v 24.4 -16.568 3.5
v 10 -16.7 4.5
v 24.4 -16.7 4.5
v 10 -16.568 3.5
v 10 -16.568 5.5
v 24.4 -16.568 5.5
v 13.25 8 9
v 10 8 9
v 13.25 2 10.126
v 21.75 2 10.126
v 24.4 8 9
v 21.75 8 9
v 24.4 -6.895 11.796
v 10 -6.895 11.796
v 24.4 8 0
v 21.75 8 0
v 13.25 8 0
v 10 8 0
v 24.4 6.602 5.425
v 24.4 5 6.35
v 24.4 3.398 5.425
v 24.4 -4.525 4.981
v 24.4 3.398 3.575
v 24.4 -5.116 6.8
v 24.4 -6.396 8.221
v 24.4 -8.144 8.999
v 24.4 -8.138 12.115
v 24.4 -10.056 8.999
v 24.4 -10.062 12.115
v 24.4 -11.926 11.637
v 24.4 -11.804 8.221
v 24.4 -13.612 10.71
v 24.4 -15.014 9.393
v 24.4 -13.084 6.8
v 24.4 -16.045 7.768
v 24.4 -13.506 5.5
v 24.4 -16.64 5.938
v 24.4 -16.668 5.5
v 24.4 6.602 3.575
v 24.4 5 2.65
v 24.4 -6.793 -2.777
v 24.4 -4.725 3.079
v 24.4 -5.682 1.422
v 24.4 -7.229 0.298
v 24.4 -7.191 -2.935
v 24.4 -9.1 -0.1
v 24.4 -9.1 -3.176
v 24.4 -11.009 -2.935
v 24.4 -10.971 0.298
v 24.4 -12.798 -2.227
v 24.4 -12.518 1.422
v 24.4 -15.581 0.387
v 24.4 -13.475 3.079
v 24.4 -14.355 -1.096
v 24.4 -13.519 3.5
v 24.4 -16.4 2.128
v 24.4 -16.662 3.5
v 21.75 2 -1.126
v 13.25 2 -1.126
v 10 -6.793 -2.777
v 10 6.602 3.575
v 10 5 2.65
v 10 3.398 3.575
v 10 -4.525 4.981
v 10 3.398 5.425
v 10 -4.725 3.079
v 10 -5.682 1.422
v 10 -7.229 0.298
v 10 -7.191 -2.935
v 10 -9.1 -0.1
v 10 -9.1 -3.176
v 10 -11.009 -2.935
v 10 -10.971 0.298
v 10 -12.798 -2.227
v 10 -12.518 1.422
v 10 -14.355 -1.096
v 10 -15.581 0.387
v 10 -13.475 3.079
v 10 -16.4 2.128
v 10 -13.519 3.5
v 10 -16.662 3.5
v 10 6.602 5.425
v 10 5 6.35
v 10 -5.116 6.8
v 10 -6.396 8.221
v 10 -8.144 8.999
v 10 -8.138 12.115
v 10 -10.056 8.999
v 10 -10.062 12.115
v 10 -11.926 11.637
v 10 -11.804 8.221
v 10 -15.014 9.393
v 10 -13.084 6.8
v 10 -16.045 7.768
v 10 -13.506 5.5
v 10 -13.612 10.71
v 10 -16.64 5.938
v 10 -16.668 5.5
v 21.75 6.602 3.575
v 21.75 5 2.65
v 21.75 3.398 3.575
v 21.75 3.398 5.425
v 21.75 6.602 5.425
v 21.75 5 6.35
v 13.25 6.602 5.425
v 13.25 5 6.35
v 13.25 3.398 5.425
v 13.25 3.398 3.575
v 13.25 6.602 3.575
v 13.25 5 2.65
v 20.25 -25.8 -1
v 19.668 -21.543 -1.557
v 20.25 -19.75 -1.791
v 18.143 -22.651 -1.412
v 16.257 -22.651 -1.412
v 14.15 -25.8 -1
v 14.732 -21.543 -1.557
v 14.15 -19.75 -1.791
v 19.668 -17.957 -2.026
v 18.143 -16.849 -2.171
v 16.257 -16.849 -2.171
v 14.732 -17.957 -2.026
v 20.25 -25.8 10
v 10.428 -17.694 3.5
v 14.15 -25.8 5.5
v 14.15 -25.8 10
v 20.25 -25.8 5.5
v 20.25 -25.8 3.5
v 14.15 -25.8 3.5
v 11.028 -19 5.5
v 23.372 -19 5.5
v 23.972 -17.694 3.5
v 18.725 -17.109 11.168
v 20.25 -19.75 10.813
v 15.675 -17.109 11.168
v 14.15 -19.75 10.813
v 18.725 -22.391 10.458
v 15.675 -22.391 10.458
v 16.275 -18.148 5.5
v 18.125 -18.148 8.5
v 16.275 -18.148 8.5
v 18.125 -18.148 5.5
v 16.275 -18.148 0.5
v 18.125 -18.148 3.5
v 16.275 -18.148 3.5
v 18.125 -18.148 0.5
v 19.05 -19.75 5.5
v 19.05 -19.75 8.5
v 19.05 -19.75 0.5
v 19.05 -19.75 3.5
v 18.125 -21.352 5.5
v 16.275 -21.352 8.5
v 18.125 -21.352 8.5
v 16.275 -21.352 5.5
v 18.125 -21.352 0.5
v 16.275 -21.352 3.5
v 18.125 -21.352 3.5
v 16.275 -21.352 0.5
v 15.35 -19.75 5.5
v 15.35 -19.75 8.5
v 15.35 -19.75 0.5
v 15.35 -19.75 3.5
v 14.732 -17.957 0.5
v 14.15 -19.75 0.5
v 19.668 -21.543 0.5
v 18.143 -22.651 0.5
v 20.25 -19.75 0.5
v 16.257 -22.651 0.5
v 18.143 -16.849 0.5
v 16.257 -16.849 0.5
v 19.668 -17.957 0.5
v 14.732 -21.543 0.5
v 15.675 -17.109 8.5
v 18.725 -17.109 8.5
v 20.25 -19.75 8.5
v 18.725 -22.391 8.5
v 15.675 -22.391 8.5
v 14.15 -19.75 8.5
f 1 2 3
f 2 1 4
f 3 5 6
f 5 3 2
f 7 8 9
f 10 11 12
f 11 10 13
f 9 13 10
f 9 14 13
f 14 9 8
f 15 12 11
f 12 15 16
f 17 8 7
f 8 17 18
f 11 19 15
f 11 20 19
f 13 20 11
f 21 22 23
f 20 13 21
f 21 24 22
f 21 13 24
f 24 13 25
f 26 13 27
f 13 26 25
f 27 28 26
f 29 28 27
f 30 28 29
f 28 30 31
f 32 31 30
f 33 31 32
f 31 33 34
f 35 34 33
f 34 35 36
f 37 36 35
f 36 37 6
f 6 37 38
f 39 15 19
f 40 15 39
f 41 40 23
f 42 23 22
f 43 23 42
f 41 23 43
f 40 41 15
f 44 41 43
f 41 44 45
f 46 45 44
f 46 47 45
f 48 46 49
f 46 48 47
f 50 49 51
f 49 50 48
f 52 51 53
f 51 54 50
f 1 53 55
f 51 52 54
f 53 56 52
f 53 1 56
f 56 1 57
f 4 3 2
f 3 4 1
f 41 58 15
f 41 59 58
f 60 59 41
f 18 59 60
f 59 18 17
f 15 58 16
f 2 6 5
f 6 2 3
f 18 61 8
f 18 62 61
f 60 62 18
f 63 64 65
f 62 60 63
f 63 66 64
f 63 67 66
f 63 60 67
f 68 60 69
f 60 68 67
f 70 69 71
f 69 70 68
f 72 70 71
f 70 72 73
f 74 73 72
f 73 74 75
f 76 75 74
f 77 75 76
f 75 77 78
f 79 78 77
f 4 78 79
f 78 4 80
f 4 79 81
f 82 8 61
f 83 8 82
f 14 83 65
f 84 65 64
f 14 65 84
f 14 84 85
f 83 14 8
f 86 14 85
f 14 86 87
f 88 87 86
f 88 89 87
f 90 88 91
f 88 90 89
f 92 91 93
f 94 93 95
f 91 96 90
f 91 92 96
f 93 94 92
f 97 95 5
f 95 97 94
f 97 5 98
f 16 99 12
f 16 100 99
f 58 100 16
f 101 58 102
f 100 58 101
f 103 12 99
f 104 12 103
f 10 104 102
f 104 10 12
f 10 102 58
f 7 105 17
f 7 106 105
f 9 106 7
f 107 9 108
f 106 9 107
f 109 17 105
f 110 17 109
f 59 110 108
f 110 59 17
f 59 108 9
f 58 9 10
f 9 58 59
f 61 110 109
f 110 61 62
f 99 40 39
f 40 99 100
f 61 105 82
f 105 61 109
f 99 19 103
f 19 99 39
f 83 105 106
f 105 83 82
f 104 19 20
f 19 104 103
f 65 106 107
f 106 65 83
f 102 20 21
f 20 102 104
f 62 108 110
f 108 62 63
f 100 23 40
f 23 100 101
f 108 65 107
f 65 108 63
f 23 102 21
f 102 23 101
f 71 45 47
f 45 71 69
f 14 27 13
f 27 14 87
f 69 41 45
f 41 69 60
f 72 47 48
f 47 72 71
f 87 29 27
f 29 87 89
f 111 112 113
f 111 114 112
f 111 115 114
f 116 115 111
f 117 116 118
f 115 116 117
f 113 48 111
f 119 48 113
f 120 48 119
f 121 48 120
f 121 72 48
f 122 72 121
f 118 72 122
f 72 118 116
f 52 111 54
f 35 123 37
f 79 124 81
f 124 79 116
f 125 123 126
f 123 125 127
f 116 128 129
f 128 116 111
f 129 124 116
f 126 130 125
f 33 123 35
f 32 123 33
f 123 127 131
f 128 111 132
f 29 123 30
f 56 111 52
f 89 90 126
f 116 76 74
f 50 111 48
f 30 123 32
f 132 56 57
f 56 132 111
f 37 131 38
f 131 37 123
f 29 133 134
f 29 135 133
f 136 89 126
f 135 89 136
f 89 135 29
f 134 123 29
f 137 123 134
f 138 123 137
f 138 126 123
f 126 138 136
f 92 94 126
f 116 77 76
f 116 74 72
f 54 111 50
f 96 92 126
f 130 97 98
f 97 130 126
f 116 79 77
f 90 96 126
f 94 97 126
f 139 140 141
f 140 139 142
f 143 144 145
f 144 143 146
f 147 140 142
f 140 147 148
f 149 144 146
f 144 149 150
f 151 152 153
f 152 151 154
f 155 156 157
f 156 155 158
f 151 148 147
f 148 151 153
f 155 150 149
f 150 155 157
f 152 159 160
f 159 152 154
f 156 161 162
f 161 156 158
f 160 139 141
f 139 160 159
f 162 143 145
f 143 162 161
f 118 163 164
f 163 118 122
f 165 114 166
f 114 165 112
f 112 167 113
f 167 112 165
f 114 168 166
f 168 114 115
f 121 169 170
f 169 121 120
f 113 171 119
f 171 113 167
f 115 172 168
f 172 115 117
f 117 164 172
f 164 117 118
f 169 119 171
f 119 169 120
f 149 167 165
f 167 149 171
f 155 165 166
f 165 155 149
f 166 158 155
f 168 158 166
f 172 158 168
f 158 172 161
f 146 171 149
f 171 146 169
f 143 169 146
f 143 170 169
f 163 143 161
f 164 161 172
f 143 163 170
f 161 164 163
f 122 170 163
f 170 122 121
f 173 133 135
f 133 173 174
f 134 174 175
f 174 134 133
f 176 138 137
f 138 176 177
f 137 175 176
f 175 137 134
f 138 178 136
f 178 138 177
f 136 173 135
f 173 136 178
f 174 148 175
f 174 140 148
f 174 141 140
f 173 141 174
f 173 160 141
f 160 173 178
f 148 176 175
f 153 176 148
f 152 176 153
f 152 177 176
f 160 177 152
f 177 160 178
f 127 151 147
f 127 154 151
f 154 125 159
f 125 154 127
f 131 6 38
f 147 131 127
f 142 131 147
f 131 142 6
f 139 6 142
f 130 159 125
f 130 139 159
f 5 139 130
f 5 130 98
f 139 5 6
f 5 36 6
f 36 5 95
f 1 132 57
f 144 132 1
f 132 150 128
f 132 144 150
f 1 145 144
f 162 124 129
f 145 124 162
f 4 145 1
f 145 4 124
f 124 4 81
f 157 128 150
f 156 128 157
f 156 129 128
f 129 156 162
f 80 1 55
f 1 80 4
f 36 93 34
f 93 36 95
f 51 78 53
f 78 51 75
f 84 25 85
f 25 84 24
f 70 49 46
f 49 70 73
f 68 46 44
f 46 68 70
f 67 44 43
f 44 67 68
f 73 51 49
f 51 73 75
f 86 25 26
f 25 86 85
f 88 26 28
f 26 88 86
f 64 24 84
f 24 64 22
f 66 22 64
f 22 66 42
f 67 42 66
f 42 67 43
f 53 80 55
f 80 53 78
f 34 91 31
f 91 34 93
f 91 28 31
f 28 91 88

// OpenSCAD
$fn = 0;

enable_angledtabs = 1;  // [0,1]
enable_ledge = 1;  // [0,1]
clamp_height = 9;  // [0:200]
clamp_length = 8; // [0:200]
clamp_width = 15; // [0:200]
//clamp_depth = 10;  // how deep into the part the gap proceeds
clamp_gap_depth = 7;  // [2:190]
slot_gap = 2;  // [2:190]
plate_thickness = 8.5; // [2:190]
screw_hole_diam = 3.7;  // [1:20]
screw_hole_depth = 4;  // [0:20]
screw_recess_diam = 6.1; // [0:20]
wiretab_angle = 90;  // [-270:270]
nut_type = 6; // [4:6]
wire_diam = 9.2; // [1:40]

hinged_pole_clamp(
clamp_width=clamp_width,
  depth = 10,
  length = clamp_length + 1,
  gap=clamp_gap_depth,
  height=clamp_height,
  hole_diam=screw_hole_diam,
  hole_recess_diam=screw_recess_diam,
  wirediam=wire_diam,
  nut_type=nut_type
  );


module hinged_pole_clamp(
    depth,
    length,
    gap,
    height,
    hole_diam,
    clamp_width,
    hole_recess_diam,
    wirediam,
    horiz_tab_angle=40,
    horiz_thick=3,
    nut_type=6
){
  hinge_fill_x = depth; //hardcoded to fit the hinge footprint
  hinge_fill_y = length;
  hinge_fill_z = height;
  hole_gap = gap;
  hole_r = hole_diam/2;
  pole_r = clamp_width/2;
  hole_recess_r = hole_recess_diam/2;
    

  wire_r = wirediam/2;

  half_space = 0; // gap between the two halfs
  half_width = clamp_width * 1.2;
  half_depth = clamp_width * 0.6;
    union(){
      difference(){
          
          //back portion
        hull(){
           

//square portion
          translate([hinge_fill_x,-1 ,0])
              cube(size=[half_width*0.8, length, hinge_fill_z]);

//ledge
            if (enable_ledge == 1)
            {
          translate([hinge_fill_x,0-(clamp_width/2)+(horiz_thick)-(wire_r),height/2])
            pole_with_tabs_neg(
              width=half_width*0.8,
              pole_r=wire_r,
              pole_thick=horiz_thick,
              hole_diam=screw_hole_diam,
              tab=false,
              tab_angle=horiz_tab_angle);
            }
        }


        // wire hole
        translate([
            hinge_fill_x-(clamp_width*0.1),
            0-(clamp_width/2)+(horiz_thick)-(wire_r),
            height/2])
          pole_with_tabs_neg(
            width=half_width*0.9,
            pole_r=wire_r,
            pole_thick=horiz_thick,
            hole_diam=screw_hole_diam,
            tab=true,
            tab_angle=horiz_tab_angle);
        echo(( depth + (clamp_width / 2 ) - (plate_thickness /2) ));
        // plate slot
        //translate([ ((hinge_fill_x * 2)), length / 2 - clamp_gap +.25 ,hinge_fill_x + 1]) 
        //translate([ (clamp_width / 2 + (plate_thickness * 2)) + 2, length / 2 - clamp_gap_depth +.25 ,height  + 10  ]) 
            translate([ ( depth + (clamp_width / 2 ) - (plate_thickness /2)), (length - clamp_gap_depth),height  + 10  ]) 
            rotate(a=90, v=[0,1,0]) 
            cube(size=[height + 20, hole_gap, plate_thickness]);
            
        //screw hole
            translate([0, length - screw_hole_depth,height/2])
            rotate(a=90, v=[0,1,0])
            cylinder(h=hinge_fill_x * 4, r=hole_diam/2);

      }


        // the hole and fin
      translate([
          hinge_fill_x,
          0-(clamp_width/2)+(horiz_thick)-(wire_r),
          height/2])
        pole_with_tabs(
          width=half_width*0.8,
          pole_r=wire_r,
          pole_thick=horiz_thick,
          hole_diam=screw_hole_diam,
          hole_recess_diam=screw_recess_diam,
          nut_type=nut_type,
          tab_angle=horiz_tab_angle);

    }
}



//*********************************************************

module pole_with_tabs_neg(width, pole_r, pole_thick, hole_diam, tab=false, tab_angle=0, gap=1){
  rotate(a=90, v=[0,1,0]){
    cylinder(h=width, r=pole_r+pole_thick);
  }

  if(tab==true){
    // screw hole in tab
    rotate(a=tab_angle, v=[1,0,0])
      translate([width/2,
                 0,
                 pole_r+(pole_thick)+hole_diam ]) {
        // tab gap
        cube([width*1.1, gap, (hole_diam*2)+(pole_thick*3)], center=true);
      }
  }
}


module pole_with_tabs(width, pole_r, pole_thick, hole_diam, hole_recess_diam, nut_type=6, tab_angle=0, gap=1){
  hole_r = hole_diam/2;
  difference(){
    union(){
      rotate(a=90, v=[0,1,0]){
        cylinder(h=width, r=(pole_r+pole_thick)*1.01);
      }

      // tab block
      hull(){
          
          //angled tab sides
          if (enable_angledtabs == 1){
            rotate(a=90, v=[0,1,0]){
              cylinder(h=width, r=(pole_r+pole_thick)*1.01);
            }
          }
        
        //tab
        rotate(a=wiretab_angle, v=[1,0,0])
          translate([width/2, 0, ((hole_recess_diam)+(pole_thick*2)+pole_r)/2]){
            cube([
              hole_recess_diam,
              (pole_thick*2)+5,
              (hole_recess_diam)+(pole_thick*2)+pole_r],
              center=true);
          }
        }
    }

    // pole hole
    translate([0-(width*0.5), 0, 0])
      rotate(a=90, v=[0,1,0]){
        cylinder(h=width*2.0, r=pole_r);
      }

    // screw hole in tab
    rotate(a=wiretab_angle, v=[1,0,0])
      translate([width/2,
                 0,
                 pole_r+(pole_thick)+(hole_recess_diam/2) ]) {

        // screw hole
        rotate(a=90, v=[1,0,0]){
          cylinder(h=pole_r*3, r=hole_r, center=true);

          //screw recesses
          translate([0, 0, 0+(pole_r/2)+(pole_thick+gap)]){
            cylinder(h=pole_r, r=hole_recess_diam/2, center=true);
          }
          
          // nut recess
          translate([0, 0, 0-(pole_r/2)-(pole_thick+gap)]){
            cylinder(h=pole_r, r=hole_recess_diam/2, center=true, $fn=nut_type);
          }
        }

        // tab gap
        cube([width*1.1, slot_gap, (hole_recess_diam*2)+(pole_thick*3)], center=true);
      }
  }

}
